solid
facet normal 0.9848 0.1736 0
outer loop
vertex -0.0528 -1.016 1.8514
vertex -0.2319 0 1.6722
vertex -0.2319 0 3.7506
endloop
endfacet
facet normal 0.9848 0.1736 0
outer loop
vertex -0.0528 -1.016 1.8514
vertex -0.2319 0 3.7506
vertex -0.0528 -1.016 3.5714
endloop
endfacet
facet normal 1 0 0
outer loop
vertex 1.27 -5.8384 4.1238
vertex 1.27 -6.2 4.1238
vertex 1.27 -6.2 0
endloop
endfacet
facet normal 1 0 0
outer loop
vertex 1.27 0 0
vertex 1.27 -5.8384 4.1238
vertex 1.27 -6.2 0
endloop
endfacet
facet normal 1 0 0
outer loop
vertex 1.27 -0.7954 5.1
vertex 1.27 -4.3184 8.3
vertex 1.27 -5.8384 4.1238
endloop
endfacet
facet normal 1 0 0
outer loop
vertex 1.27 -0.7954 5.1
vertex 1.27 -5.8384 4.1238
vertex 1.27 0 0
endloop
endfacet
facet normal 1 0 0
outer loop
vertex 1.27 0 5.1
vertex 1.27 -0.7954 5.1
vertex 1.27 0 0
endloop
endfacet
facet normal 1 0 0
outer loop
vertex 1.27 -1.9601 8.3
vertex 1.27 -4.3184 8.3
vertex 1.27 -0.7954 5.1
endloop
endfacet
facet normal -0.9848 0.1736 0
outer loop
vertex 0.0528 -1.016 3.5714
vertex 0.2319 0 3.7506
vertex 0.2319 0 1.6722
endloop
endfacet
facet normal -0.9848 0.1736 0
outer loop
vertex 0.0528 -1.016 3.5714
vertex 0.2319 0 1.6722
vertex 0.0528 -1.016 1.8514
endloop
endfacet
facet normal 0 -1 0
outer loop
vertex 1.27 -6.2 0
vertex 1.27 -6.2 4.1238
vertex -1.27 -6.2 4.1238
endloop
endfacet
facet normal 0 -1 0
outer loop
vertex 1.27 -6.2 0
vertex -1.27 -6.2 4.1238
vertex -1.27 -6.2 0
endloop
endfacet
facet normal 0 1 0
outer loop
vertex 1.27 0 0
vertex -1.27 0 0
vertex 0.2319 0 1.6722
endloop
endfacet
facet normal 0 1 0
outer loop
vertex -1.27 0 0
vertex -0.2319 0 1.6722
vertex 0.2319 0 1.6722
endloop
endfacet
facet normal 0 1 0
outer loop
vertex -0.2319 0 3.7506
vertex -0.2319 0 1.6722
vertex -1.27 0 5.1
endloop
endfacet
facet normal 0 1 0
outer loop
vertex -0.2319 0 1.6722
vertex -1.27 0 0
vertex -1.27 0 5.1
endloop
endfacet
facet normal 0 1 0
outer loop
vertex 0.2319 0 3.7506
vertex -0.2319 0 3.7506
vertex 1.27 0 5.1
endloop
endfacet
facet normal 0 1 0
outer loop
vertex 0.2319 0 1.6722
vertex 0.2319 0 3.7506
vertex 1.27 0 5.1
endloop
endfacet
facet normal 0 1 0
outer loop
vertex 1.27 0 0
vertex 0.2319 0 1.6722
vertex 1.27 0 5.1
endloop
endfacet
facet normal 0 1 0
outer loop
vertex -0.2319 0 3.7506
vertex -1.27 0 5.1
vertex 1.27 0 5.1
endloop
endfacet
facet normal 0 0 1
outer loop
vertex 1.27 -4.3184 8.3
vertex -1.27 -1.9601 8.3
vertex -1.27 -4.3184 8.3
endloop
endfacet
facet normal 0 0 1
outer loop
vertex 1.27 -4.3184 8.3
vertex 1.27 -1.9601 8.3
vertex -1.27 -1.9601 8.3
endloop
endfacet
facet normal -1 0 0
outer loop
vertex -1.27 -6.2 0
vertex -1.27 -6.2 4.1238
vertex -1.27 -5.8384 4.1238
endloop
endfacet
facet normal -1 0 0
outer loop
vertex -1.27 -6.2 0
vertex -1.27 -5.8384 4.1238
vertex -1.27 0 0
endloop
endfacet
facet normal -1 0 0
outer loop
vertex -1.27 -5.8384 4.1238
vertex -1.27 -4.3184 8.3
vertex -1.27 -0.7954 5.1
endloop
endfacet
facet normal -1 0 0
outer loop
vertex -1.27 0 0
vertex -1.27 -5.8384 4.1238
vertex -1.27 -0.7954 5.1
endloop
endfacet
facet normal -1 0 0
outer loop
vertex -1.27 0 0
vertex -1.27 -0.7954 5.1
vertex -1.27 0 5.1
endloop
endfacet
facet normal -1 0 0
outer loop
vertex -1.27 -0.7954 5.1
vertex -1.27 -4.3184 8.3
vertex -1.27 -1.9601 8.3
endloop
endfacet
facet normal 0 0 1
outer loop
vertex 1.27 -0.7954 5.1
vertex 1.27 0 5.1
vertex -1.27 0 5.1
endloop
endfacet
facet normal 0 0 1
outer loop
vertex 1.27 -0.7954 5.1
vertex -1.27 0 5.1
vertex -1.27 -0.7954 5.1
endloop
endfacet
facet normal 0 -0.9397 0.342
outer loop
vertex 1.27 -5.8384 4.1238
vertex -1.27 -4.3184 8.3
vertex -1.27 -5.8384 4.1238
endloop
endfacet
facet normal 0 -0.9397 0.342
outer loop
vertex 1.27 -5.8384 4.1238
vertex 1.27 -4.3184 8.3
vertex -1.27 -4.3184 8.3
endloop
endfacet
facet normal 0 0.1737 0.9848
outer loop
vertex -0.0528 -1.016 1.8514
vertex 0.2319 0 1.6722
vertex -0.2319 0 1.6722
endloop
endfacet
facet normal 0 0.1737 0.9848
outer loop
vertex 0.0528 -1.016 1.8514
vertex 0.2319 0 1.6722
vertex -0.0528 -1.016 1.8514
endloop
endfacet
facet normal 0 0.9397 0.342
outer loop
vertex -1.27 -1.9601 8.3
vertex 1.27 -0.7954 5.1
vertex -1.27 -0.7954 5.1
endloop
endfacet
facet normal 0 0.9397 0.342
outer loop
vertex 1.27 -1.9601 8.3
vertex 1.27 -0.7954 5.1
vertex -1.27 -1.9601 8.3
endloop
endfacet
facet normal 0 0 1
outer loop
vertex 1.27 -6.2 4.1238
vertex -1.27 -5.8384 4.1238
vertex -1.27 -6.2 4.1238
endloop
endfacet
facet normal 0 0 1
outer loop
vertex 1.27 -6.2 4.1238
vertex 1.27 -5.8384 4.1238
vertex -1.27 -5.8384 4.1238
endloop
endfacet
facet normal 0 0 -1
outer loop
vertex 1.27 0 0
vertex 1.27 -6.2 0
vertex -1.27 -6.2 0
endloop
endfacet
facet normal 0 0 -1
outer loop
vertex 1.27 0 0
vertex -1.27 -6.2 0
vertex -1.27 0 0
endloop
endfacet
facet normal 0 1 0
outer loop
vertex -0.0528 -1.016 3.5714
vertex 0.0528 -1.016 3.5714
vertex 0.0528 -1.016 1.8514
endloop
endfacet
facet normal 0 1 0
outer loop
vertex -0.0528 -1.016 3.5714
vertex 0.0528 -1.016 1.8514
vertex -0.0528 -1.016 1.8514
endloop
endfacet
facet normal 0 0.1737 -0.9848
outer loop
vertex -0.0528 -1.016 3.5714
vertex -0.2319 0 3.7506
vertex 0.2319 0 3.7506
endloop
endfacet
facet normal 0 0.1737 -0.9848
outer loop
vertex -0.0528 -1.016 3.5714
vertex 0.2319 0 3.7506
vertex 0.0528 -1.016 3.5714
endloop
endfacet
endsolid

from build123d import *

# Parameters (mm, degrees)
F1_DEPTH     = 1.27
F2_W         = 1.8970449455
F2_H         = 3.5115340725
F3_DEPTH     = 1.016
F4_T4_DEPTH  = 1.8970449455
F4_T9_DEPTH  = 3.5115340725
F4_T14_DEPTH = 1.8970449455
F4_T19_DEPTH = 3.5115340725


# Not quite as in the source:
# - a fillet or chamfer that OpenCascade refuses, or shapes differently, is made with other operations: its cross-section is extruded or revolved along the edge and cut away or added


with BuildPart() as f1:
    # F0 (on Right) → F1 (new body, symmetric)
    with BuildSketch(Plane.YZ):
        Polygon((-5.8383567513, 4.1238272734), (-6.2, 4.1238272734), (-6.2, 0), (0, 0), (0, 5.1), (-0.7954361361, 5.1), (-1.9601408858, 8.3), (-4.3183541857, 8.3), align=None)
    extrude(amount=F1_DEPTH, both=True)

    # F2 (on face) → F3 (cut)
    with BuildSketch(Plane(origin=(0, 0, 0), x_dir=(-1, 0, 0), z_dir=(0, 1, 0))):
        with Locations((0, 2.7114218101)):
            Rectangle(F2_W, F2_H)
    extrude(amount=-F3_DEPTH, mode=Mode.SUBTRACT)

    # F4: chamfer of 5.08 x 0.895741062 on 4 edges, made by hand


with BuildPart() as f4_tool2:
    # F4_s3 → F4_t4 (new body)
    with BuildSketch(Plane.YZ.offset(-0.9485224728)):
        Polygon((4.064, 4.4671888463), (-1.016, 3.5714477843), (-1.016, 4.4671888463), align=None)
    extrude(amount=F4_T4_DEPTH)

    split(bisect_by=Plane.XZ, keep=Keep.TOP)


with BuildPart() as f1_1:
    add(f1.part)

    # F4_t1: union F4_tool2
    add(f4_tool2.part)


with BuildPart() as f4_tool7:
    # F4_s8 → F4_t9 (new body)
    with BuildSketch(Plane.XY.offset(4.4671888463)):
        Polygon((0.9485224728, 4.064), (0.0527814108, -1.016), (0.9485224728, -1.016), align=None)
    extrude(amount=-F4_T9_DEPTH)

    split(bisect_by=Plane.XZ, keep=Keep.TOP)


with BuildPart() as f1_2:
    add(f1_1.part)

    # F4_t6: union F4_tool7
    add(f4_tool7.part)


with BuildPart() as f4_tool12:
    # F4_s13 → F4_t14 (new body)
    with BuildSketch(Plane.YZ.offset(0.9485224728)):
        Polygon((4.064, 0.9556547739), (-1.016, 1.8513958359), (-1.016, 0.9556547739), align=None)
    extrude(amount=-F4_T14_DEPTH)

    split(bisect_by=Plane.XZ, keep=Keep.TOP)


with BuildPart() as f1_3:
    add(f1_2.part)

    # F4_t11: union F4_tool12
    add(f4_tool12.part)


with BuildPart() as f4_tool17:
    # F4_s18 → F4_t19 (new body)
    with BuildSketch(Plane.XY.offset(0.9556547739)):
        Polygon((-0.9485224728, 4.064), (-0.0527814108, -1.016), (-0.9485224728, -1.016), align=None)
    extrude(amount=F4_T19_DEPTH)

    split(bisect_by=Plane.XZ, keep=Keep.TOP)


with BuildPart() as f1_4:
    add(f1_3.part)

    # F4_t16: union F4_tool17
    add(f4_tool17.part)


solid = f1_4.part
